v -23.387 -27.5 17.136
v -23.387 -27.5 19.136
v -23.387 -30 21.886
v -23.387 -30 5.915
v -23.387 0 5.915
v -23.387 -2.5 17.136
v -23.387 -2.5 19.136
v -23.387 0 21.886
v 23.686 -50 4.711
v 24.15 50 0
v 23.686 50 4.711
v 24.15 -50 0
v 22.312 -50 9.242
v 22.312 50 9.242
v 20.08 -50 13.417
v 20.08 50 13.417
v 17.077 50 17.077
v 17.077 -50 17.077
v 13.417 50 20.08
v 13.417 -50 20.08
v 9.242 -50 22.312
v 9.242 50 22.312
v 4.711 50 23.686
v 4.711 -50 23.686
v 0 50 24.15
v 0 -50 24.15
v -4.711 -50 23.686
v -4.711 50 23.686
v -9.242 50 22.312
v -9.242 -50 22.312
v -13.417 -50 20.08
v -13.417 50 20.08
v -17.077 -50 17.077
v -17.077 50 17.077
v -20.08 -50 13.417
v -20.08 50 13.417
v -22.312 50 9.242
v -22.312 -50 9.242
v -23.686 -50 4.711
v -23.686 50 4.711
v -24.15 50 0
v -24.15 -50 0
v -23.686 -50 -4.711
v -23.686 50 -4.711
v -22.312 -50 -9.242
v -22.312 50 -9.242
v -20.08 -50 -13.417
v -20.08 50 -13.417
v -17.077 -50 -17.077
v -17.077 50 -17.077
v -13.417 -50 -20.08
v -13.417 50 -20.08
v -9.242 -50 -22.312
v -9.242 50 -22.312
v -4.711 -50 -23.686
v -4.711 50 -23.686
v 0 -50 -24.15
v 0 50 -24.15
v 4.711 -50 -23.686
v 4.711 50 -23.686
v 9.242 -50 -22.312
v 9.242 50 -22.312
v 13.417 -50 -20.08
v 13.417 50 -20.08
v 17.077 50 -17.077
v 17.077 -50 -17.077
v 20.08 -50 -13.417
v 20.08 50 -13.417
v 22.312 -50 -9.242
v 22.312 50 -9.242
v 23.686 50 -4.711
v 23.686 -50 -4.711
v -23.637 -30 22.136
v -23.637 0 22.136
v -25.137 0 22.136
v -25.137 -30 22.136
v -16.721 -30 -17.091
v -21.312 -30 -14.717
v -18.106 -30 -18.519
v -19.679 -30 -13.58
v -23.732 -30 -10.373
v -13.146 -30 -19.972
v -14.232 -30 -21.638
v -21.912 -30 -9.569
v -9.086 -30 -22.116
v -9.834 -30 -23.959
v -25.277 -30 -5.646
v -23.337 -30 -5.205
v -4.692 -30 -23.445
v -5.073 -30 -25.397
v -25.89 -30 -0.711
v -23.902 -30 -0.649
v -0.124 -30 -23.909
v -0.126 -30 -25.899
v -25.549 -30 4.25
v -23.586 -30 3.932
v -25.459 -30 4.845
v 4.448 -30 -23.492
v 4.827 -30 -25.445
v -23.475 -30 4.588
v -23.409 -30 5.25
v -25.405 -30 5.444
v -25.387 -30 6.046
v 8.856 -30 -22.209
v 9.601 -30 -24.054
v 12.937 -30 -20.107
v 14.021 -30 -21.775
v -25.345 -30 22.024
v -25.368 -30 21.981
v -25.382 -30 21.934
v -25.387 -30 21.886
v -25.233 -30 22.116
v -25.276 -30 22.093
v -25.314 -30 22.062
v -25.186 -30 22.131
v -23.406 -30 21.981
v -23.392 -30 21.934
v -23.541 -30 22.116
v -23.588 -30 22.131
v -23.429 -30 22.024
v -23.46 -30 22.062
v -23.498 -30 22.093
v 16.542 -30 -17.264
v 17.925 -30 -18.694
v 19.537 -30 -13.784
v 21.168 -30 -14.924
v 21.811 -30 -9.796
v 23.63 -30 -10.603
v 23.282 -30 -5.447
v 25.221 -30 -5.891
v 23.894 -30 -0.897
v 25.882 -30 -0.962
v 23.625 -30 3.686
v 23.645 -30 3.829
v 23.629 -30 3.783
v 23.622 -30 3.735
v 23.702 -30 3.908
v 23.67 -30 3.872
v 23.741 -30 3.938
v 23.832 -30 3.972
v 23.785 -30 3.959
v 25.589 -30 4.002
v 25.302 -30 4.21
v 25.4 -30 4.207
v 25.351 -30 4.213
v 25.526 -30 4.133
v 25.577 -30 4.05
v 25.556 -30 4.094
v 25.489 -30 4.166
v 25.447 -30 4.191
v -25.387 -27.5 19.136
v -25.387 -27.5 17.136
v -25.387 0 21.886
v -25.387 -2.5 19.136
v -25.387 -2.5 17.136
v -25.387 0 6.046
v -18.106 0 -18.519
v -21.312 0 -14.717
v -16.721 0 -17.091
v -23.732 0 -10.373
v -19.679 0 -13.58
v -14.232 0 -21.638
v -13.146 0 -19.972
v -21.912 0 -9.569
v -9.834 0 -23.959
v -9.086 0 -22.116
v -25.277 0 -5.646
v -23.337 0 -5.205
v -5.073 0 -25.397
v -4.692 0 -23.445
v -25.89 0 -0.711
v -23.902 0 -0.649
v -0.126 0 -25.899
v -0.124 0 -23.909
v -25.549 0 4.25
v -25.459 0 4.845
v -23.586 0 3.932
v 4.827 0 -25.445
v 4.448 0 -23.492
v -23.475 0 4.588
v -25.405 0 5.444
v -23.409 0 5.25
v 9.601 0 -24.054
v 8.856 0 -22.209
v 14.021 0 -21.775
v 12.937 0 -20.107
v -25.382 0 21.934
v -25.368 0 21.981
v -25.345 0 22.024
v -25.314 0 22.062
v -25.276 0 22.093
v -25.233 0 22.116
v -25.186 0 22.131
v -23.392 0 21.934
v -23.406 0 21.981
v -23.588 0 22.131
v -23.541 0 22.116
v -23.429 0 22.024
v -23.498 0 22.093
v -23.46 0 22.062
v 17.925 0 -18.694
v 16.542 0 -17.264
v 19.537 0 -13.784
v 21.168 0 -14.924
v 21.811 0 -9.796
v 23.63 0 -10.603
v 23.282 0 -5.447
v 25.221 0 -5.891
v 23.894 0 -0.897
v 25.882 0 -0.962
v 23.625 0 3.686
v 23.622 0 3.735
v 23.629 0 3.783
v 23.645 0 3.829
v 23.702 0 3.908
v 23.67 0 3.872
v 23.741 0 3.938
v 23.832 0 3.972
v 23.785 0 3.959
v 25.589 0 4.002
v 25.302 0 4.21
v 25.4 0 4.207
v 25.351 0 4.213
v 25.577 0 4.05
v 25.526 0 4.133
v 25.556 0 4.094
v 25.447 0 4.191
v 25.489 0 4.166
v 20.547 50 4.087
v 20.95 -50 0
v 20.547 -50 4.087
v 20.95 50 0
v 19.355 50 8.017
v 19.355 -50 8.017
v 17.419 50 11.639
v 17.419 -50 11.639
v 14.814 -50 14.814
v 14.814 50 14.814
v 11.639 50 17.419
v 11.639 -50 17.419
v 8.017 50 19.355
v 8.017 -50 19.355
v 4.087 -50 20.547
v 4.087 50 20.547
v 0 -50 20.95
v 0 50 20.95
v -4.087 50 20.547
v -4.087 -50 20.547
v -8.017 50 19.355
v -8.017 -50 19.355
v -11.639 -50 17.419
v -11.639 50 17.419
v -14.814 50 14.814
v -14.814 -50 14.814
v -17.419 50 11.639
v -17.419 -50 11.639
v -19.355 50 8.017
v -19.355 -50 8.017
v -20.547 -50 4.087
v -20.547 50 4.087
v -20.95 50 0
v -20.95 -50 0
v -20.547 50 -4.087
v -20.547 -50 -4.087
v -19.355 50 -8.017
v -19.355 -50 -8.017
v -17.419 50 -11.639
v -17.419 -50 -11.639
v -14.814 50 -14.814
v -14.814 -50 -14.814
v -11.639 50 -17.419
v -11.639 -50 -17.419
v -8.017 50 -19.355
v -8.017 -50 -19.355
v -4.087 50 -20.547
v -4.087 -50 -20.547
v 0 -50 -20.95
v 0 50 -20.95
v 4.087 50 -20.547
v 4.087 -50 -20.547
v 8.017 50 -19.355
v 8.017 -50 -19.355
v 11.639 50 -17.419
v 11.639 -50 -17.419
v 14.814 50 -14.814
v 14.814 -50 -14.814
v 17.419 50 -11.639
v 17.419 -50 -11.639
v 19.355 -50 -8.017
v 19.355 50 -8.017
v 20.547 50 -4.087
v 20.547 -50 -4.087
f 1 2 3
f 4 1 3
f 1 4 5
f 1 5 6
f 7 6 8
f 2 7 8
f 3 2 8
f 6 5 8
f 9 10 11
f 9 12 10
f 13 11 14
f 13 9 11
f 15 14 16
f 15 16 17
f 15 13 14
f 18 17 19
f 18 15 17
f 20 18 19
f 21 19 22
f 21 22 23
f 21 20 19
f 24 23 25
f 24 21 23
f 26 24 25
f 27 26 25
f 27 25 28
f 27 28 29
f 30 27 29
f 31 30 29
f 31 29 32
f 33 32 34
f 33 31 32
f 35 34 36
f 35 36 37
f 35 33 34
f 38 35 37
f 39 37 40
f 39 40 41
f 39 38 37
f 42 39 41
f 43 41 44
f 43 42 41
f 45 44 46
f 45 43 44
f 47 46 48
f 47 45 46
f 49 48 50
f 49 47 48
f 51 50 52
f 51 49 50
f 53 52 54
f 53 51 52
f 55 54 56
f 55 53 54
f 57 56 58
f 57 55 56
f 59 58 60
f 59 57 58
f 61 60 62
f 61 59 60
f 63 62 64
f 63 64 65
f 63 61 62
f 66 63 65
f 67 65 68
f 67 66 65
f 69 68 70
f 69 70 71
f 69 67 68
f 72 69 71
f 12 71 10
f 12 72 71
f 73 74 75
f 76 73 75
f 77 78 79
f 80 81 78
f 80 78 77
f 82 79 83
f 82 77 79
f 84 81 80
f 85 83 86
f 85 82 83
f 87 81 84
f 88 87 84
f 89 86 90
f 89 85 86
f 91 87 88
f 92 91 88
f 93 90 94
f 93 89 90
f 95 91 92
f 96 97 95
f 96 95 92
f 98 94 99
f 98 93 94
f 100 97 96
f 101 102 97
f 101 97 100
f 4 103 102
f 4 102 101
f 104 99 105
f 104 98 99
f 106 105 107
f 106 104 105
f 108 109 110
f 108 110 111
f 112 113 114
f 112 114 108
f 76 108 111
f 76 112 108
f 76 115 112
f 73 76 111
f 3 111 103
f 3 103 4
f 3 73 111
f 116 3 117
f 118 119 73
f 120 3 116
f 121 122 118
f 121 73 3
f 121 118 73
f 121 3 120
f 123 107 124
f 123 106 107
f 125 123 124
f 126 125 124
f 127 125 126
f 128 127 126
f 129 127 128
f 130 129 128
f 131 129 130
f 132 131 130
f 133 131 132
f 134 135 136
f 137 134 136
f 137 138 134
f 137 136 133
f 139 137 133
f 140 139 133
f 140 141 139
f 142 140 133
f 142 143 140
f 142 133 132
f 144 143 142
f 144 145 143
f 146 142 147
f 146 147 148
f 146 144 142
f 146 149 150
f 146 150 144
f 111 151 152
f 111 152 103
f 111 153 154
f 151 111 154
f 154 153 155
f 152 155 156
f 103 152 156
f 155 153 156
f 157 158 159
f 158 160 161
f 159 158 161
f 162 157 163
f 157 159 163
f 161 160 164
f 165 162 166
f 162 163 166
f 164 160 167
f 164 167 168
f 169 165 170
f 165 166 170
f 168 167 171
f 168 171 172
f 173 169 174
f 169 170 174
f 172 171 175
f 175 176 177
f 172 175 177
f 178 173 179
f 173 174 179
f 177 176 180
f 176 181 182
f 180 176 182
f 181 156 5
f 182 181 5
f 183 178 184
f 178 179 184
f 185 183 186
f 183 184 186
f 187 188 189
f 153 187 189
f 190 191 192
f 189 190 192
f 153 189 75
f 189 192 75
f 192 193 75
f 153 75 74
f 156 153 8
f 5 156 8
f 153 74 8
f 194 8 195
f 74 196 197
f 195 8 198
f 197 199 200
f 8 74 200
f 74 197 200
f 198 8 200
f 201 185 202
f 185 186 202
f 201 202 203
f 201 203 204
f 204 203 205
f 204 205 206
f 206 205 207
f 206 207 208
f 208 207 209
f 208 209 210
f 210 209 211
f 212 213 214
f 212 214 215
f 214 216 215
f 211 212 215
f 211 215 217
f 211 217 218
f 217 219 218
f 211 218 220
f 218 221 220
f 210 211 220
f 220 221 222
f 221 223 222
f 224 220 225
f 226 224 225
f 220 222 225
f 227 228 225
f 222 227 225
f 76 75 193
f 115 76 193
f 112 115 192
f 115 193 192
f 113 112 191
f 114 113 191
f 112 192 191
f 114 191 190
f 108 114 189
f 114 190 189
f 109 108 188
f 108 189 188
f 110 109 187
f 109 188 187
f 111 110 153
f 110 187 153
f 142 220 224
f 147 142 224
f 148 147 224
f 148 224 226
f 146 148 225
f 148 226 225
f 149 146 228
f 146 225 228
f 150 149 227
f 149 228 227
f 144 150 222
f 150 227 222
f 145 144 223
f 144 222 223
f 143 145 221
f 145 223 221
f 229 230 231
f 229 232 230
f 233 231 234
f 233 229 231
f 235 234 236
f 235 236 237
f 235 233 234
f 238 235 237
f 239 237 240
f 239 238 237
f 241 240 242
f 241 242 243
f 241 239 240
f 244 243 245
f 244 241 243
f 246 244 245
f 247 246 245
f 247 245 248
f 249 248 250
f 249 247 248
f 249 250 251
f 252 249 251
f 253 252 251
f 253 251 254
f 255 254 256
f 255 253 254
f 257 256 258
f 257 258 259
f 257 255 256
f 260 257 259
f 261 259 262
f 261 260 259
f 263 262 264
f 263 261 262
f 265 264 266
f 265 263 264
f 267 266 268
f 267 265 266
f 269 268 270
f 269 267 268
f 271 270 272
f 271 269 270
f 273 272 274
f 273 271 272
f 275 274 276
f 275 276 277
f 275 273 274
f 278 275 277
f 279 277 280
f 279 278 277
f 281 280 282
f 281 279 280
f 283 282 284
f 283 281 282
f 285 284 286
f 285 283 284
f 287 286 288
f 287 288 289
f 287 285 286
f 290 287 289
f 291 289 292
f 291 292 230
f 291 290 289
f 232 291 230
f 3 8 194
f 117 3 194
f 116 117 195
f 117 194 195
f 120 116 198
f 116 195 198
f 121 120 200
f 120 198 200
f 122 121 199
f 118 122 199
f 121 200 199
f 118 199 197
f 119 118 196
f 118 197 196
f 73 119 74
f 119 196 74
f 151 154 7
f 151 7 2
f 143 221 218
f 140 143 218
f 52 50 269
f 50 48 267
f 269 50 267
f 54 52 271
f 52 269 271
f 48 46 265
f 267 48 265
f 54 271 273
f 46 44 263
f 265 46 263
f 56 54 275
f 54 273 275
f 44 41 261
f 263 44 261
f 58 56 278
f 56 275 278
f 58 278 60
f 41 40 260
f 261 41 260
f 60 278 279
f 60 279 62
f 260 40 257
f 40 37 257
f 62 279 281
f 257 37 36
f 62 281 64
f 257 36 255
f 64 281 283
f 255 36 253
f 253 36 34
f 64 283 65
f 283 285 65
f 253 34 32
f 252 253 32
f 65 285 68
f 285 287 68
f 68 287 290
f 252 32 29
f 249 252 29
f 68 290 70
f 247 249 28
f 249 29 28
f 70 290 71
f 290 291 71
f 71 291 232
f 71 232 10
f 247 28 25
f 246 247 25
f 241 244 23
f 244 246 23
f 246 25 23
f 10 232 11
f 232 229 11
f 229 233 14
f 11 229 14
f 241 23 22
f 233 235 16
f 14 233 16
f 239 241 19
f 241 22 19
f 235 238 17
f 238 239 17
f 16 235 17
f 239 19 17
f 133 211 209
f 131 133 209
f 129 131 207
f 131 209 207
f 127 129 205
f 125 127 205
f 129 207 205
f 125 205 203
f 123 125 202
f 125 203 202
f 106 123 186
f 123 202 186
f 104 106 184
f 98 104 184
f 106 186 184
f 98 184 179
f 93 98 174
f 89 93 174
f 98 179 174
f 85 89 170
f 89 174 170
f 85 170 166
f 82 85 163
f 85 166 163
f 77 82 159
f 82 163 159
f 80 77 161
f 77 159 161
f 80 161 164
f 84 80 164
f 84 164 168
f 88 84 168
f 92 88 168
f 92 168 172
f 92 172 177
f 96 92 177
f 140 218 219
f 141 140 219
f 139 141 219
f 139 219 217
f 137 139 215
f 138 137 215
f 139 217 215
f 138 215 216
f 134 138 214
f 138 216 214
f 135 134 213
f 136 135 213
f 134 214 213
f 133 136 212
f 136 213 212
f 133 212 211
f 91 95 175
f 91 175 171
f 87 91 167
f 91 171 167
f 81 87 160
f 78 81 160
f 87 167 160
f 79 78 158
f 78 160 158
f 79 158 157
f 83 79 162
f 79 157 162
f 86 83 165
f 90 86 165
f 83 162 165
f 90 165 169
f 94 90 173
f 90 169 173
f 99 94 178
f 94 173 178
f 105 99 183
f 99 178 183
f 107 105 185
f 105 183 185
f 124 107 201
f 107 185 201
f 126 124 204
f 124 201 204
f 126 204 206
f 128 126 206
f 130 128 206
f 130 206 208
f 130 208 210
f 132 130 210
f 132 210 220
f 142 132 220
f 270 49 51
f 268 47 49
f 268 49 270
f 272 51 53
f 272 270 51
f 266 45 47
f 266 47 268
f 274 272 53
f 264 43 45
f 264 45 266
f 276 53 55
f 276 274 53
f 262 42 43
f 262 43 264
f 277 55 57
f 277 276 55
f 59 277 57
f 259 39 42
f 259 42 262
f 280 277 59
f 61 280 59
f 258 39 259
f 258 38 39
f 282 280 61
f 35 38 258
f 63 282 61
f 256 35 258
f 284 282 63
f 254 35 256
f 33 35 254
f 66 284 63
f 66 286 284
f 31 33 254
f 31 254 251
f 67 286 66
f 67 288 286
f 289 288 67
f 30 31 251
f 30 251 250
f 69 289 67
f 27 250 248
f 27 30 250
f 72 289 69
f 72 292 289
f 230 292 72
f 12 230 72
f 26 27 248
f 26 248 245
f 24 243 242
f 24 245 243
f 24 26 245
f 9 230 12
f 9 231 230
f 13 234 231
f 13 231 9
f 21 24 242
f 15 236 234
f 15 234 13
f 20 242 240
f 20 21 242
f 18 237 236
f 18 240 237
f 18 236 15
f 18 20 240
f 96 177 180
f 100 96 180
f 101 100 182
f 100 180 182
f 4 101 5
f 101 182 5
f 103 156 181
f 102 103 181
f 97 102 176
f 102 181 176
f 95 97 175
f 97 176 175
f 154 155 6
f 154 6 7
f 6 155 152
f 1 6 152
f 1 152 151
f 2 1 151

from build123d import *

# Parameters (mm, degrees)
F0_R     = 24.15
F0_R_2   = 20.95
F1_DEPTH = 50
F3_DEPTH = 30
F5_W     = 25
F5_H     = 2
F6_DEPTH = 51.2881315685


# Not quite as in the source:
# - a feature of the source that left no trace in its solid (it failed there, or was rolled back) is left out


with BuildPart() as f1:
    # F0 (on Front) → F1 (new body, symmetric)
    with BuildSketch(Plane.XZ):
        Circle(F0_R)
        Circle(F0_R_2, mode=Mode.SUBTRACT)
    extrude(amount=F1_DEPTH, both=True)


with BuildPart() as f3:
    # F2 (on Front) → F3 (new body)
    with BuildSketch(Plane.XZ):
        with BuildLine():
            Line((-25.3868595608, 21.8855109754), (-25.3868595608, 6.0457583589))
            ThreePointArc((-25.3868595608, 6.0457583589), (-25.4275675824, 5.1443687165), (-25.5493602183, 4.250317832))
            ThreePointArc((-25.5493602183, 4.250317832), (-0.1257323753, -25.8986821176), (25.5894092407, 4.0020627281))
            ThreePointArc((25.5894092407, 4.0020627281), (25.4891661105, 4.1658377534), (25.3023462898, 4.2102145337))
            Line((25.3023462898, 4.2102145337), (23.8321379738, 3.9715227194))
            ThreePointArc((23.8321379738, 3.9715227194), (23.6698358356, 3.8715466122), (23.6251881424, 3.6862258374))
            ThreePointArc((23.6251881424, 3.6862258374), (-0.1242226088, -23.9092333702), (-23.5856250226, 3.9315007559))
            ThreePointArc((-23.5856250226, 3.9315007559), (-23.4366750052, 4.9184773412), (-23.3868595608, 5.9153862181))
            Line((-23.3868595608, 5.9153862181), (-23.3868595608, 21.8855109754))
            ThreePointArc((-23.3868595608, 21.8855109754), (-23.4600828655, 22.0622876707), (-23.6368595608, 22.1355109754))
            Line((-23.6368595608, 22.1355109754), (-25.1368595608, 22.1355109754))
            ThreePointArc((-25.1368595608, 22.1355109754), (-25.3136362561, 22.0622876707), (-25.3868595608, 21.8855109754))
        make_face()
    extrude(amount=F3_DEPTH)

    # F5 (on face) → F6 (cut, through all)
    with BuildSketch(Plane(origin=(-25.3868595608, 0, 0), x_dir=(0, -1, 0), z_dir=(-1, 0, 0))):
        with Locations((15, 18.1355109754)):
            Rectangle(F5_W, F5_H)
    extrude(amount=-F6_DEPTH, mode=Mode.SUBTRACT)


solid = Compound([f1.part, f3.part])
